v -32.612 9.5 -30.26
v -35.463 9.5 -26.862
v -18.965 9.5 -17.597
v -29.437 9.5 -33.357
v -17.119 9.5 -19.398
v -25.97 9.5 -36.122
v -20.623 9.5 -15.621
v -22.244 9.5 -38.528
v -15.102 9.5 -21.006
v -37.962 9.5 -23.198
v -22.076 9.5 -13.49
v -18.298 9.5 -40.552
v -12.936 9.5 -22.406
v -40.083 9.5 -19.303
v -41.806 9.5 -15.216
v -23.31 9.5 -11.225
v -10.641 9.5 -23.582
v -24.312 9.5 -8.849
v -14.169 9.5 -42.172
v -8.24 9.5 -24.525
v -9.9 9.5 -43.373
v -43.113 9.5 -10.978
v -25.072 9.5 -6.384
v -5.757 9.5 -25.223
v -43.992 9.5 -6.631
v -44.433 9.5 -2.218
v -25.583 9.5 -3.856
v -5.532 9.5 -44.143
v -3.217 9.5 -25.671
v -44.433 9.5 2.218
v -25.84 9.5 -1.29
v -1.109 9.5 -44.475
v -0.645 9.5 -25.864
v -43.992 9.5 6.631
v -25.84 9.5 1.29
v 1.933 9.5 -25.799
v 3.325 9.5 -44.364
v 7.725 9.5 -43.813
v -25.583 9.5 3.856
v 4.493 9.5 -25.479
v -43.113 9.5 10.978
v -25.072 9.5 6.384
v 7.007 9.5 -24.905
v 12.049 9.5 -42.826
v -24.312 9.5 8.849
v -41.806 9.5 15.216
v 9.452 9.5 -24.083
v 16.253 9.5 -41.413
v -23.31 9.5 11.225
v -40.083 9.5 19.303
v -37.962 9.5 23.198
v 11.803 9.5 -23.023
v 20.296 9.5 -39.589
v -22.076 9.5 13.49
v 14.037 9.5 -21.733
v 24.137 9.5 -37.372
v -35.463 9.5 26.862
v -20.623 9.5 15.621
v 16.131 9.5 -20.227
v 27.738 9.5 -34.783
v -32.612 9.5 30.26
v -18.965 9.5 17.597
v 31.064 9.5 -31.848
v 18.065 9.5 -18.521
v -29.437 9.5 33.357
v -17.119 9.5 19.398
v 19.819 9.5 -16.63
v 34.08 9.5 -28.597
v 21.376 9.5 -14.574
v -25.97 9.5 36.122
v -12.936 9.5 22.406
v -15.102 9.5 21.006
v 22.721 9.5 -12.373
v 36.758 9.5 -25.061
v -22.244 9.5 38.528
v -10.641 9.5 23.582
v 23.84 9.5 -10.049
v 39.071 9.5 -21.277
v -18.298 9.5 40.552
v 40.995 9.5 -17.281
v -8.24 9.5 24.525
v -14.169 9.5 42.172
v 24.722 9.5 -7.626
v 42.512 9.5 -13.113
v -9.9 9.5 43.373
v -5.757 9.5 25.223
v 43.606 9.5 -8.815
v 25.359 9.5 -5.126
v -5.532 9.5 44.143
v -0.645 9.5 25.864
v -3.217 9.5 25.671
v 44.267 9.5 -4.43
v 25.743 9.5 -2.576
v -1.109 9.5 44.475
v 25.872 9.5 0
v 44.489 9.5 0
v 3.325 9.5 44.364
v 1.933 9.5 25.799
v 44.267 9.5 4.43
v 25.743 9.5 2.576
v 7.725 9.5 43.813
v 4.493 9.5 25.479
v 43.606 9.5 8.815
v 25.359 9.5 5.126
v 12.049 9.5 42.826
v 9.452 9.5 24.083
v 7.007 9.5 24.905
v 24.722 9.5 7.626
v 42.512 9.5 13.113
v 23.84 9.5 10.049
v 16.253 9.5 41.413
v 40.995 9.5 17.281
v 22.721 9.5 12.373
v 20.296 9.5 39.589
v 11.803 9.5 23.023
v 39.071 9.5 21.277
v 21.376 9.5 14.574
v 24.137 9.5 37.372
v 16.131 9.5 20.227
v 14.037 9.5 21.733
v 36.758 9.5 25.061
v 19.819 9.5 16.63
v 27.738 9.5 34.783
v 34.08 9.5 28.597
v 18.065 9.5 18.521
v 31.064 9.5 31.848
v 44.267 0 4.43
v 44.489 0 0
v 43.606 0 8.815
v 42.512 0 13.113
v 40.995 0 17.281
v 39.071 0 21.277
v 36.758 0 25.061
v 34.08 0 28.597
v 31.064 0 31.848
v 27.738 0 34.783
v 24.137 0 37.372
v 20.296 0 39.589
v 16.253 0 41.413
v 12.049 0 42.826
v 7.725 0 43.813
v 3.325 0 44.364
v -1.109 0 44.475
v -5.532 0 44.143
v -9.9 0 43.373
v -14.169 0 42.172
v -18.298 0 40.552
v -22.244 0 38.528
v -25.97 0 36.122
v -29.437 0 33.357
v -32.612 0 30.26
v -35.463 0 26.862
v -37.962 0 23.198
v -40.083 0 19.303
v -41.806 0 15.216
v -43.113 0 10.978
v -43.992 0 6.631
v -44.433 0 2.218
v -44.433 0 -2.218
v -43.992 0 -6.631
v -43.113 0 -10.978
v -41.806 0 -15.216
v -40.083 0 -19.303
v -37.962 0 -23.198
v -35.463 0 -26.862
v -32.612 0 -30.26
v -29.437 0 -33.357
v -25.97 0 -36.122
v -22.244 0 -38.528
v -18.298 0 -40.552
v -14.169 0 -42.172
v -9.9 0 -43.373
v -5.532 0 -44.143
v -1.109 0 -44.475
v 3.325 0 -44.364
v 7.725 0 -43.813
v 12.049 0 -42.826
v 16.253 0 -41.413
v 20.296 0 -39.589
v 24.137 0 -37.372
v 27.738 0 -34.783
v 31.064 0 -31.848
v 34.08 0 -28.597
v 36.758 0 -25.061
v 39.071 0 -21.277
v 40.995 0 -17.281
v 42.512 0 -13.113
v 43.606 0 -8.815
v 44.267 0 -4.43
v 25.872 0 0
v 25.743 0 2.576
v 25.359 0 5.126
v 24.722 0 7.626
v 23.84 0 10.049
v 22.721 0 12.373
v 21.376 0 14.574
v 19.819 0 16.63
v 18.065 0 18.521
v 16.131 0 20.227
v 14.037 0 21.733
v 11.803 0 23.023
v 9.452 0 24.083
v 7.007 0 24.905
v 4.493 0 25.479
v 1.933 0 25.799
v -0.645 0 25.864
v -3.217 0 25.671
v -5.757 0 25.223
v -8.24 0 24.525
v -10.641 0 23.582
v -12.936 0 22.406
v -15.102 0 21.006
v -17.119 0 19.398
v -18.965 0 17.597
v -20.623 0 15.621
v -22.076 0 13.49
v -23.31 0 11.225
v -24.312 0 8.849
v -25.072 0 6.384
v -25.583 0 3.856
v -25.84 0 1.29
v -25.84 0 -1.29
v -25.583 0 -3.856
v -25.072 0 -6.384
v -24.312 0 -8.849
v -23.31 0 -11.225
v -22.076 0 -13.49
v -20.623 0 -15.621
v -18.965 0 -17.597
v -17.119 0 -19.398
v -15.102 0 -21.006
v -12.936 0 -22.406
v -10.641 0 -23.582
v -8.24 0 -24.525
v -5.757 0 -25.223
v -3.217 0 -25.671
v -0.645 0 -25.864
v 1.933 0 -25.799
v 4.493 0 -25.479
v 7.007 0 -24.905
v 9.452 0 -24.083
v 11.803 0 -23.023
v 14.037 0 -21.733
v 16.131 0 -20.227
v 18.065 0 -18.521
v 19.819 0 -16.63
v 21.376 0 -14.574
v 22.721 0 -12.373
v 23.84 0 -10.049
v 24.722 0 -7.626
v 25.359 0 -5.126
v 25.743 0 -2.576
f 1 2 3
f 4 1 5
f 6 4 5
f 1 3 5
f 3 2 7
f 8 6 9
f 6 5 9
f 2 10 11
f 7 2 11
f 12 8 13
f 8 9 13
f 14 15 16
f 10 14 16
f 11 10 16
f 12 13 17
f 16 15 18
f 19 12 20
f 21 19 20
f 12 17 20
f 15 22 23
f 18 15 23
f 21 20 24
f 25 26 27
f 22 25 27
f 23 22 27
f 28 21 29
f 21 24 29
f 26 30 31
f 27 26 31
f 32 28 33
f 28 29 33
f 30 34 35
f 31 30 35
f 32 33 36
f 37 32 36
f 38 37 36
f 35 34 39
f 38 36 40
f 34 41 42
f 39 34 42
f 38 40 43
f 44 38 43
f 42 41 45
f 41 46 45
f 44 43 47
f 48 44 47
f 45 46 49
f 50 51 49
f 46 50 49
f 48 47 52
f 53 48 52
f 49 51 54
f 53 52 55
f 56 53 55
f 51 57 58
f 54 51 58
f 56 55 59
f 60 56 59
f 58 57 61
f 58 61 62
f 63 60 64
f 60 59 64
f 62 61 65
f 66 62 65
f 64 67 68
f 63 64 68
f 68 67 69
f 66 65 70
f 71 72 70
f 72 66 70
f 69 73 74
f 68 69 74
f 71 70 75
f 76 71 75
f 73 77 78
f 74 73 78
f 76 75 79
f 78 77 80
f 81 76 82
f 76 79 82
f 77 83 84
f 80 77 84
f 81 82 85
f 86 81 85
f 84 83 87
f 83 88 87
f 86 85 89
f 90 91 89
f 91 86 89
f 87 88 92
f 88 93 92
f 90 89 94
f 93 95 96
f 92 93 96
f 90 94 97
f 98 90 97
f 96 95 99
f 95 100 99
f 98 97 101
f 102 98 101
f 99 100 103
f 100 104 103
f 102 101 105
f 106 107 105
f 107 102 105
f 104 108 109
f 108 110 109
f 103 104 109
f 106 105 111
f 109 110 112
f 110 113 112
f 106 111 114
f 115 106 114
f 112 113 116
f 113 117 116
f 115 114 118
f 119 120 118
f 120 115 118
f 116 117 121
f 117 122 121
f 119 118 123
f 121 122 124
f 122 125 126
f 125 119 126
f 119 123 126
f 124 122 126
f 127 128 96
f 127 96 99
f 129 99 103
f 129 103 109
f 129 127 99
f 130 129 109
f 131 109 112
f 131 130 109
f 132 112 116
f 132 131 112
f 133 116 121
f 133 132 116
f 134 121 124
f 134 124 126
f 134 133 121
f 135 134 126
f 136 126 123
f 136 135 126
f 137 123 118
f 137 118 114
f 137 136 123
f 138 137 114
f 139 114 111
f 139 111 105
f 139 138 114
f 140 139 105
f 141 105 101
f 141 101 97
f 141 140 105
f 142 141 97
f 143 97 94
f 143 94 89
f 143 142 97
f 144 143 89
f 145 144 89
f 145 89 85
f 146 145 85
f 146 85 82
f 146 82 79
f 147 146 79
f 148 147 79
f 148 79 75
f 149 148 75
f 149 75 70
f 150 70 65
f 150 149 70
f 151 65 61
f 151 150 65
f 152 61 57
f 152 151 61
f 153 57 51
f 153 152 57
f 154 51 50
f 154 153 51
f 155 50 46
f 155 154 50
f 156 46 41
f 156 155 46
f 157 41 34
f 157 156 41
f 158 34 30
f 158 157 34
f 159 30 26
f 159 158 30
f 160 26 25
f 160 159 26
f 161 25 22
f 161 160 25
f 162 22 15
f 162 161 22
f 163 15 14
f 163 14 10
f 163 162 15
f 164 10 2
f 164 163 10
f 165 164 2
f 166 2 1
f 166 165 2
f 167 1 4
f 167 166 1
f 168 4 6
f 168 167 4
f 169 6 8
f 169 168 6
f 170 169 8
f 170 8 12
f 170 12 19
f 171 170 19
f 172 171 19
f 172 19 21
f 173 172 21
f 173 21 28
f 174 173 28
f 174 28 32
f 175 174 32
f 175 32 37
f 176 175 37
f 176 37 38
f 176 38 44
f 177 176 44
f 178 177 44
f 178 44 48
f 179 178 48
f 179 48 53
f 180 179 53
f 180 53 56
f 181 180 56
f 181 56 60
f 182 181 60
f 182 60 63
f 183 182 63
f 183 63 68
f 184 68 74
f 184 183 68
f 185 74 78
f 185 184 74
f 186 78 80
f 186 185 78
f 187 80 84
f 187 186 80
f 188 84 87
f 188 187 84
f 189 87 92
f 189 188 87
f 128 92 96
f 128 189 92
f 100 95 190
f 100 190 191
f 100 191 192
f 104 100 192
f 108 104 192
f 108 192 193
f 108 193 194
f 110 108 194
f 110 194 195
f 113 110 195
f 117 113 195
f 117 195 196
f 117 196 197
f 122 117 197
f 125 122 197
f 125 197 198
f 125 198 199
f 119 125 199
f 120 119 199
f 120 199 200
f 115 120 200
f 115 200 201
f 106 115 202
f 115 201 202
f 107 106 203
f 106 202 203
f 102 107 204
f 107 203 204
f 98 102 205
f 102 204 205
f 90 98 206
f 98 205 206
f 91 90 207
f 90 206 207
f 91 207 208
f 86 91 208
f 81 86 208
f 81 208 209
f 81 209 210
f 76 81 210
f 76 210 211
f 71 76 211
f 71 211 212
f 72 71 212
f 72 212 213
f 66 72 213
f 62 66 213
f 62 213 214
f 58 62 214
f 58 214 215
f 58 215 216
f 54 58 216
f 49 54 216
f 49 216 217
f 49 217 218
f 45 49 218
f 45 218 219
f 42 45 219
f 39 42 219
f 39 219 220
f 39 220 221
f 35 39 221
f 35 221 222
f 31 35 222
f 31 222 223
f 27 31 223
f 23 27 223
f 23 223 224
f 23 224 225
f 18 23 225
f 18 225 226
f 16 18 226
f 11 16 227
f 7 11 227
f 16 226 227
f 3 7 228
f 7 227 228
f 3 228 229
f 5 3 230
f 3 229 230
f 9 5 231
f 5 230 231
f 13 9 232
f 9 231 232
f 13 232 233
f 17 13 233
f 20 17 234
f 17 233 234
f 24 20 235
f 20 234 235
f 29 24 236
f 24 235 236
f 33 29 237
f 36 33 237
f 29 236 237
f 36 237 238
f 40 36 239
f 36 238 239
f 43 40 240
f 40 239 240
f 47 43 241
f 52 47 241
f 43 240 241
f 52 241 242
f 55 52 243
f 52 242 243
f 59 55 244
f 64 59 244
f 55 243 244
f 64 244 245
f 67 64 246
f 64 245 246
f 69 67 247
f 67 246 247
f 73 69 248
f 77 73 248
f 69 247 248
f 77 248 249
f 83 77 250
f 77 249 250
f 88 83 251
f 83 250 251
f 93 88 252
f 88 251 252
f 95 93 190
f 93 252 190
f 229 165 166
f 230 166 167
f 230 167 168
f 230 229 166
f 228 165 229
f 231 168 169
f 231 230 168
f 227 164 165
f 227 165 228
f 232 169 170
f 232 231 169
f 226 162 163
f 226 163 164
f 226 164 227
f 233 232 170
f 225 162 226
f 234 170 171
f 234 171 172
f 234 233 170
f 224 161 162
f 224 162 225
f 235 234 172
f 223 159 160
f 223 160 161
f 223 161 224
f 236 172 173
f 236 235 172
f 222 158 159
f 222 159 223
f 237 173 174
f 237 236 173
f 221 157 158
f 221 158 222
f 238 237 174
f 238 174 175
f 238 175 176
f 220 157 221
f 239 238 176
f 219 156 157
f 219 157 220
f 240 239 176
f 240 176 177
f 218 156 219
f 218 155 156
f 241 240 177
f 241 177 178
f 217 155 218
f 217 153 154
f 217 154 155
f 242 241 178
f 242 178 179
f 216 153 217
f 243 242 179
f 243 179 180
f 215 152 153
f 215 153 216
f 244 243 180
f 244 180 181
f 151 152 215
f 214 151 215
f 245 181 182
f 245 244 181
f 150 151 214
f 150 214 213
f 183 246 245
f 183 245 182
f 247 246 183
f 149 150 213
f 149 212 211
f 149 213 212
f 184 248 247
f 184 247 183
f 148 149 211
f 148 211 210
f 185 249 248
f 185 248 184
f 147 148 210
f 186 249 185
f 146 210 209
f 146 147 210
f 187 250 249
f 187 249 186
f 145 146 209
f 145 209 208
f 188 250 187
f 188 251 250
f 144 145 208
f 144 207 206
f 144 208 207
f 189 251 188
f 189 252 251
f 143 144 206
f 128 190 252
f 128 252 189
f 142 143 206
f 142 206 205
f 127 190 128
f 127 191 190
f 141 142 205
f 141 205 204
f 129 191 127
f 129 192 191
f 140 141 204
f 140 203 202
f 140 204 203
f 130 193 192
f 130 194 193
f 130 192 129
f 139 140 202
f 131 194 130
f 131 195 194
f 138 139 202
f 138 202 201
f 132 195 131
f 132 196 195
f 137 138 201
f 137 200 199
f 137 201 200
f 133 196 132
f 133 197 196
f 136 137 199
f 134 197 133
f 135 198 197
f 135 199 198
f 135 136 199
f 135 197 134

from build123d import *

# Parameters (mm, degrees)
F0_R     = 44.48852
F1_DEPTH = 9.5
F2_R     = 25.811478
F4_DEPTH = 8.7
F5_R     = 25.87177
F6_DEPTH = 25


with BuildPart() as f1:
    # F0 (on Front) → F1 (new body)
    with BuildSketch(Plane.XZ):
        Circle(F0_R)
    extrude(amount=-F1_DEPTH)

    # F2 (on Front) → F4 (join)
    with BuildSketch(Plane.XZ):
        Circle(F2_R)
    extrude(amount=-F4_DEPTH)

    # F5 (on Front) → F6 (cut)
    with BuildSketch(Plane.XZ):
        Circle(F5_R)
    extrude(amount=-F6_DEPTH, mode=Mode.SUBTRACT)


solid = f1.part
